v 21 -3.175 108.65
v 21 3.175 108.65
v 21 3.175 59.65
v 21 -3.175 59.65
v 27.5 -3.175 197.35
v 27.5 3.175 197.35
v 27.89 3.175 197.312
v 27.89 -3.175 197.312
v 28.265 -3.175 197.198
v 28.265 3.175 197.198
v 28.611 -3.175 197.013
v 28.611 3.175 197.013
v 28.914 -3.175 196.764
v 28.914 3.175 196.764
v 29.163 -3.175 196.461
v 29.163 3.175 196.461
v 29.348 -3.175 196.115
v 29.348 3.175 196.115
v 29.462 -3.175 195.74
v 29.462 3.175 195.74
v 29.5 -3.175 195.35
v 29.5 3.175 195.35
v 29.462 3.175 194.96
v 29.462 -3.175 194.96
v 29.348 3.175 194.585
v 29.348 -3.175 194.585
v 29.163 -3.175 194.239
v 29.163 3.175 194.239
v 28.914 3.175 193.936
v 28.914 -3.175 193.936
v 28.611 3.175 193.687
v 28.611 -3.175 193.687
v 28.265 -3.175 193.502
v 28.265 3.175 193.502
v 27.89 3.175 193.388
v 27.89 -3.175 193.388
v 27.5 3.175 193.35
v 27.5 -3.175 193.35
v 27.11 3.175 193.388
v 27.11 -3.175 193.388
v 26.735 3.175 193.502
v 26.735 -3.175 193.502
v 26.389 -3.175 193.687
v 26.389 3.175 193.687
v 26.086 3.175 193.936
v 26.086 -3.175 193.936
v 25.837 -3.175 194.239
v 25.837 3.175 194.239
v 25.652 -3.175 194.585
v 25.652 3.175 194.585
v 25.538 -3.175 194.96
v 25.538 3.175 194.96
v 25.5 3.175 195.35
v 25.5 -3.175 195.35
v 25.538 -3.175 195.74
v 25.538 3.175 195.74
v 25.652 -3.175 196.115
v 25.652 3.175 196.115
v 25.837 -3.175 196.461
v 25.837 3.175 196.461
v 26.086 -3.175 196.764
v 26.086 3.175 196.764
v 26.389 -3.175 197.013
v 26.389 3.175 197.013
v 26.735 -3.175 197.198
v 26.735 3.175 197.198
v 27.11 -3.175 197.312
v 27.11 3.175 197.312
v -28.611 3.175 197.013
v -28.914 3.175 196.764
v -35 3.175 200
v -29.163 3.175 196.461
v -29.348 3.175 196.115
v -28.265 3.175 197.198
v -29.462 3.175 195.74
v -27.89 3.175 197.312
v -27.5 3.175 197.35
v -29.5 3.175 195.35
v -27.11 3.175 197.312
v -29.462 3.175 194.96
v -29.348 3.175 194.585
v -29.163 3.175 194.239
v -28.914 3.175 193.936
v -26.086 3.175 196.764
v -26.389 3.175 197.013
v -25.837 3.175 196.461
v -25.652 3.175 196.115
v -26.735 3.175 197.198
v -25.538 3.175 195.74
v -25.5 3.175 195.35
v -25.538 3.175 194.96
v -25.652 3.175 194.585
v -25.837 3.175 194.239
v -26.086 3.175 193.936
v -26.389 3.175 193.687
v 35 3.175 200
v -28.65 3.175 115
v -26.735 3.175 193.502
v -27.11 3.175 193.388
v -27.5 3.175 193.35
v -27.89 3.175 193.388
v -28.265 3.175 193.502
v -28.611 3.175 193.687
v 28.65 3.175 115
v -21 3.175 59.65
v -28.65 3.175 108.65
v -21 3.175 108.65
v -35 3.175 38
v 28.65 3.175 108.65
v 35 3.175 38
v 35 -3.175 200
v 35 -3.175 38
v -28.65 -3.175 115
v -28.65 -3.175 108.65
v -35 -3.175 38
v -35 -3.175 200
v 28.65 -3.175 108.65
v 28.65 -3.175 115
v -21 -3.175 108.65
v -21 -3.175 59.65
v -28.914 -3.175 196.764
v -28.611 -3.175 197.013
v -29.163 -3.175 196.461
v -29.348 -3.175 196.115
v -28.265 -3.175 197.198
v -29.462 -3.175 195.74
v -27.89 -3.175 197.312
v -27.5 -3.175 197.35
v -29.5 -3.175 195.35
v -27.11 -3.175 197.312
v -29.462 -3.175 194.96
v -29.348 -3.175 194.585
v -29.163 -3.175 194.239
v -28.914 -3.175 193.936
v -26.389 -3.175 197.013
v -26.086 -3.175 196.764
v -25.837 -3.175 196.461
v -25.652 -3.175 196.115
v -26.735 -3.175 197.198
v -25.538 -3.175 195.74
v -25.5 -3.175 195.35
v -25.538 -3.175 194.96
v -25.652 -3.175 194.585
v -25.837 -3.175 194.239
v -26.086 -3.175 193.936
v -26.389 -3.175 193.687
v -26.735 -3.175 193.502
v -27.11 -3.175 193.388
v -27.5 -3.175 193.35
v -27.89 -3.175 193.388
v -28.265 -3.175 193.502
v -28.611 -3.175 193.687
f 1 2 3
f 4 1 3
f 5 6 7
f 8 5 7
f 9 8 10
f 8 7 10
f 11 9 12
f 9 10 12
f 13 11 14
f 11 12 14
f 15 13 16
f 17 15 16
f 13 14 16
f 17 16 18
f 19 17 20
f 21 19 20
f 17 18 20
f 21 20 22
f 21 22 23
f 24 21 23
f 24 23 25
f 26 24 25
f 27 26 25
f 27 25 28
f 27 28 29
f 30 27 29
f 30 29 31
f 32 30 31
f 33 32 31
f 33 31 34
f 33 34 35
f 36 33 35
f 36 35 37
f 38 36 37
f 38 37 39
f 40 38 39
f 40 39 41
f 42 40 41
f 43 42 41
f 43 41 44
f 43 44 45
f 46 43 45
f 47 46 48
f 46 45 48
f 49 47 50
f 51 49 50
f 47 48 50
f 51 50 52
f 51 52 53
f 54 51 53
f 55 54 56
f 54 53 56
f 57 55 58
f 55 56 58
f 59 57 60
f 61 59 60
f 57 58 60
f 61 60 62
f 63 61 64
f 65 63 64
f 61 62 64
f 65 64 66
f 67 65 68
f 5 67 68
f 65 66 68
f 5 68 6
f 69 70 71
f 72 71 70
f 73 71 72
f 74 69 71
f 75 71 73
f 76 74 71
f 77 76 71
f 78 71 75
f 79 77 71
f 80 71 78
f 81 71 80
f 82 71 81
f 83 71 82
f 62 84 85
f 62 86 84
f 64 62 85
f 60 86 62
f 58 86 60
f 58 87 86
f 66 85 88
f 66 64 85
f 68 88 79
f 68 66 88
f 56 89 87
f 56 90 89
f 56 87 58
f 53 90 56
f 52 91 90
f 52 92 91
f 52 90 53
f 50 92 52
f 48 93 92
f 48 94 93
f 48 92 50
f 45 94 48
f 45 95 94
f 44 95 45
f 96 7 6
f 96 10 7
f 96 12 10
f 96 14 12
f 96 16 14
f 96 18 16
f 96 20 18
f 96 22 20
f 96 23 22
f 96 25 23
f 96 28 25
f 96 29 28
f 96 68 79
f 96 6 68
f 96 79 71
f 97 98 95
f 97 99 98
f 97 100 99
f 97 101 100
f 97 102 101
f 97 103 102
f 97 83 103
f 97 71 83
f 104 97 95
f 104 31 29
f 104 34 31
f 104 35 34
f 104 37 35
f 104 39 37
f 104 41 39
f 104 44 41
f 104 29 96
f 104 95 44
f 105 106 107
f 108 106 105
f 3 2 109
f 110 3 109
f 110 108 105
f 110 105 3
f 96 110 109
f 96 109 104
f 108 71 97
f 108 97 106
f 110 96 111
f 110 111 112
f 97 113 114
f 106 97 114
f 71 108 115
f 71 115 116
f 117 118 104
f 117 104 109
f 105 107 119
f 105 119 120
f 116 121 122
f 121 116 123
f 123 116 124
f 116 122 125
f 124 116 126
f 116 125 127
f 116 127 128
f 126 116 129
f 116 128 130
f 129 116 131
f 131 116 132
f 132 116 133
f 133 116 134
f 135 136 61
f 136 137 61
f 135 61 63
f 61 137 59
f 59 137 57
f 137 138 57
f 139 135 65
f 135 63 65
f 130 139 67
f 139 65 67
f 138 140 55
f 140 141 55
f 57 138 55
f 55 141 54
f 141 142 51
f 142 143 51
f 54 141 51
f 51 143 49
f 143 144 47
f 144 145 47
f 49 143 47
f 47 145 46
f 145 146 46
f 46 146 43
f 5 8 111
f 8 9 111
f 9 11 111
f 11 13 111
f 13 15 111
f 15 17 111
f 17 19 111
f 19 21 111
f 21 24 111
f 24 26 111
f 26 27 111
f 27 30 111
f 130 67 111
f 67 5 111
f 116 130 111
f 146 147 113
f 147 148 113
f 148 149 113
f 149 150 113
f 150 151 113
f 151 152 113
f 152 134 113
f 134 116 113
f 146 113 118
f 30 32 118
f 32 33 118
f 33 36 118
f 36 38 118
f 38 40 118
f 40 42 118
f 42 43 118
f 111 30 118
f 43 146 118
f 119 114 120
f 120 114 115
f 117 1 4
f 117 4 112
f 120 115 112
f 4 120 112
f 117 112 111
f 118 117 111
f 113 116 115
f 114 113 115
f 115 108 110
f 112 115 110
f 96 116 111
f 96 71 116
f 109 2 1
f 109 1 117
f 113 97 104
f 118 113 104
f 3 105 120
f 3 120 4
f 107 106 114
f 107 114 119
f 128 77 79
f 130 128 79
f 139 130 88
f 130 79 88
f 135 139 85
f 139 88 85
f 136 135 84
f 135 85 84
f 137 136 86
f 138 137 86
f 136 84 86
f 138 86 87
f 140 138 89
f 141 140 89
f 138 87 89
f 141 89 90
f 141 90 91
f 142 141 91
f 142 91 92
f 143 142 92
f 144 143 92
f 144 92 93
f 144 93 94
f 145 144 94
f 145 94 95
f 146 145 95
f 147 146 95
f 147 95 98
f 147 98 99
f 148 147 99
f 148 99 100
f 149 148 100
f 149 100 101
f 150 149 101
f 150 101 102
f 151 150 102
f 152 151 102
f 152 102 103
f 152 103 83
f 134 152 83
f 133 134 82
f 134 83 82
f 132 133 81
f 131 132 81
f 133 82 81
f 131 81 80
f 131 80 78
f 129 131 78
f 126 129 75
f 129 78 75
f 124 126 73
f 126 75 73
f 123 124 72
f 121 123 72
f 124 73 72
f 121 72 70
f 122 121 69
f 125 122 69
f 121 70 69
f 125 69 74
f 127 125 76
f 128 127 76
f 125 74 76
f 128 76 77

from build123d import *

# Parameters (mm, degrees)
BOSS_EXTRUDE1_DEPTH = 3.175
CUT_EXTRUDE1_DEPTH  = 204.138678001
SKETCH3_W           = 42
SKETCH3_H           = 55.35
SKETCH3_W_2         = 7.65
SKETCH3_H_2         = 6.35
CUT_EXTRUDE2_DEPTH  = 204.138678001
SKETCH5_R           = 2
CUT_EXTRUDE4_DEPTH  = 204.138678001


with BuildPart() as part:
    # Sketch1 → Boss-Extrude1 (new, symmetric)
    with BuildSketch(Plane(origin=(0, 0, 0), x_dir=(1, 0, 0), z_dir=(0, 1, 0))):
        with BuildLine():
            Line((35, -200), (35, 0))
            ThreePointArc((35, 0), (0, 35), (-35, 0))
            Line((-35, 0), (-35, -200))
            Line((-35, -200), (35, -200))
        make_face()
    extrude(amount=BOSS_EXTRUDE1_DEPTH, both=True)

    # Sketch2 → Cut-Extrude1 (cut, through all)
    with BuildSketch(Plane(origin=(0, 3.175, 0), x_dir=(1, 0, 0), z_dir=(0, 1, 0))):
        with BuildLine():
            Line((-35, -38), (35, -38))
            Line((35, -38), (35, 0))
            ThreePointArc((35, 0), (0, 35), (-35, 0))
            Line((-35, 0), (-35, -38))
        make_face()
    extrude(amount=-CUT_EXTRUDE1_DEPTH, mode=Mode.SUBTRACT)

    # Sketch3 → Cut-Extrude2 (cut, through all)
    with BuildSketch(Plane(origin=(0, 3.175, 0), x_dir=(1, 0, 0), z_dir=(0, 1, 0))):
        with Locations((0, -87.325)):
            Rectangle(SKETCH3_W, SKETCH3_H)
        with Locations((-24.825, -111.825)):
            Rectangle(SKETCH3_W_2, SKETCH3_H_2)
        with Locations((24.825, -111.825)):
            Rectangle(SKETCH3_W_2, SKETCH3_H_2)
    extrude(amount=-CUT_EXTRUDE2_DEPTH, mode=Mode.SUBTRACT)

    # Sketch5 → Cut-Extrude4 (cut, through all)
    with BuildSketch(Plane(origin=(0, 3.175, 0), x_dir=(1, 0, 0), z_dir=(0, 1, 0))):
        with Locations(Location((27.5, -195.35, 0), (0, 0, 270))):
            Circle(SKETCH5_R)
        with Locations(Location((-27.5, -195.35, 0), (0, 0, 270))):
            Circle(SKETCH5_R)
        with Locations((15, -65.35)):
            Circle(SKETCH5_R)
        with Locations((-15, -65.35)):
            Circle(SKETCH5_R)
    extrude(amount=-CUT_EXTRUDE4_DEPTH, mode=Mode.SUBTRACT)


solid = part.part
